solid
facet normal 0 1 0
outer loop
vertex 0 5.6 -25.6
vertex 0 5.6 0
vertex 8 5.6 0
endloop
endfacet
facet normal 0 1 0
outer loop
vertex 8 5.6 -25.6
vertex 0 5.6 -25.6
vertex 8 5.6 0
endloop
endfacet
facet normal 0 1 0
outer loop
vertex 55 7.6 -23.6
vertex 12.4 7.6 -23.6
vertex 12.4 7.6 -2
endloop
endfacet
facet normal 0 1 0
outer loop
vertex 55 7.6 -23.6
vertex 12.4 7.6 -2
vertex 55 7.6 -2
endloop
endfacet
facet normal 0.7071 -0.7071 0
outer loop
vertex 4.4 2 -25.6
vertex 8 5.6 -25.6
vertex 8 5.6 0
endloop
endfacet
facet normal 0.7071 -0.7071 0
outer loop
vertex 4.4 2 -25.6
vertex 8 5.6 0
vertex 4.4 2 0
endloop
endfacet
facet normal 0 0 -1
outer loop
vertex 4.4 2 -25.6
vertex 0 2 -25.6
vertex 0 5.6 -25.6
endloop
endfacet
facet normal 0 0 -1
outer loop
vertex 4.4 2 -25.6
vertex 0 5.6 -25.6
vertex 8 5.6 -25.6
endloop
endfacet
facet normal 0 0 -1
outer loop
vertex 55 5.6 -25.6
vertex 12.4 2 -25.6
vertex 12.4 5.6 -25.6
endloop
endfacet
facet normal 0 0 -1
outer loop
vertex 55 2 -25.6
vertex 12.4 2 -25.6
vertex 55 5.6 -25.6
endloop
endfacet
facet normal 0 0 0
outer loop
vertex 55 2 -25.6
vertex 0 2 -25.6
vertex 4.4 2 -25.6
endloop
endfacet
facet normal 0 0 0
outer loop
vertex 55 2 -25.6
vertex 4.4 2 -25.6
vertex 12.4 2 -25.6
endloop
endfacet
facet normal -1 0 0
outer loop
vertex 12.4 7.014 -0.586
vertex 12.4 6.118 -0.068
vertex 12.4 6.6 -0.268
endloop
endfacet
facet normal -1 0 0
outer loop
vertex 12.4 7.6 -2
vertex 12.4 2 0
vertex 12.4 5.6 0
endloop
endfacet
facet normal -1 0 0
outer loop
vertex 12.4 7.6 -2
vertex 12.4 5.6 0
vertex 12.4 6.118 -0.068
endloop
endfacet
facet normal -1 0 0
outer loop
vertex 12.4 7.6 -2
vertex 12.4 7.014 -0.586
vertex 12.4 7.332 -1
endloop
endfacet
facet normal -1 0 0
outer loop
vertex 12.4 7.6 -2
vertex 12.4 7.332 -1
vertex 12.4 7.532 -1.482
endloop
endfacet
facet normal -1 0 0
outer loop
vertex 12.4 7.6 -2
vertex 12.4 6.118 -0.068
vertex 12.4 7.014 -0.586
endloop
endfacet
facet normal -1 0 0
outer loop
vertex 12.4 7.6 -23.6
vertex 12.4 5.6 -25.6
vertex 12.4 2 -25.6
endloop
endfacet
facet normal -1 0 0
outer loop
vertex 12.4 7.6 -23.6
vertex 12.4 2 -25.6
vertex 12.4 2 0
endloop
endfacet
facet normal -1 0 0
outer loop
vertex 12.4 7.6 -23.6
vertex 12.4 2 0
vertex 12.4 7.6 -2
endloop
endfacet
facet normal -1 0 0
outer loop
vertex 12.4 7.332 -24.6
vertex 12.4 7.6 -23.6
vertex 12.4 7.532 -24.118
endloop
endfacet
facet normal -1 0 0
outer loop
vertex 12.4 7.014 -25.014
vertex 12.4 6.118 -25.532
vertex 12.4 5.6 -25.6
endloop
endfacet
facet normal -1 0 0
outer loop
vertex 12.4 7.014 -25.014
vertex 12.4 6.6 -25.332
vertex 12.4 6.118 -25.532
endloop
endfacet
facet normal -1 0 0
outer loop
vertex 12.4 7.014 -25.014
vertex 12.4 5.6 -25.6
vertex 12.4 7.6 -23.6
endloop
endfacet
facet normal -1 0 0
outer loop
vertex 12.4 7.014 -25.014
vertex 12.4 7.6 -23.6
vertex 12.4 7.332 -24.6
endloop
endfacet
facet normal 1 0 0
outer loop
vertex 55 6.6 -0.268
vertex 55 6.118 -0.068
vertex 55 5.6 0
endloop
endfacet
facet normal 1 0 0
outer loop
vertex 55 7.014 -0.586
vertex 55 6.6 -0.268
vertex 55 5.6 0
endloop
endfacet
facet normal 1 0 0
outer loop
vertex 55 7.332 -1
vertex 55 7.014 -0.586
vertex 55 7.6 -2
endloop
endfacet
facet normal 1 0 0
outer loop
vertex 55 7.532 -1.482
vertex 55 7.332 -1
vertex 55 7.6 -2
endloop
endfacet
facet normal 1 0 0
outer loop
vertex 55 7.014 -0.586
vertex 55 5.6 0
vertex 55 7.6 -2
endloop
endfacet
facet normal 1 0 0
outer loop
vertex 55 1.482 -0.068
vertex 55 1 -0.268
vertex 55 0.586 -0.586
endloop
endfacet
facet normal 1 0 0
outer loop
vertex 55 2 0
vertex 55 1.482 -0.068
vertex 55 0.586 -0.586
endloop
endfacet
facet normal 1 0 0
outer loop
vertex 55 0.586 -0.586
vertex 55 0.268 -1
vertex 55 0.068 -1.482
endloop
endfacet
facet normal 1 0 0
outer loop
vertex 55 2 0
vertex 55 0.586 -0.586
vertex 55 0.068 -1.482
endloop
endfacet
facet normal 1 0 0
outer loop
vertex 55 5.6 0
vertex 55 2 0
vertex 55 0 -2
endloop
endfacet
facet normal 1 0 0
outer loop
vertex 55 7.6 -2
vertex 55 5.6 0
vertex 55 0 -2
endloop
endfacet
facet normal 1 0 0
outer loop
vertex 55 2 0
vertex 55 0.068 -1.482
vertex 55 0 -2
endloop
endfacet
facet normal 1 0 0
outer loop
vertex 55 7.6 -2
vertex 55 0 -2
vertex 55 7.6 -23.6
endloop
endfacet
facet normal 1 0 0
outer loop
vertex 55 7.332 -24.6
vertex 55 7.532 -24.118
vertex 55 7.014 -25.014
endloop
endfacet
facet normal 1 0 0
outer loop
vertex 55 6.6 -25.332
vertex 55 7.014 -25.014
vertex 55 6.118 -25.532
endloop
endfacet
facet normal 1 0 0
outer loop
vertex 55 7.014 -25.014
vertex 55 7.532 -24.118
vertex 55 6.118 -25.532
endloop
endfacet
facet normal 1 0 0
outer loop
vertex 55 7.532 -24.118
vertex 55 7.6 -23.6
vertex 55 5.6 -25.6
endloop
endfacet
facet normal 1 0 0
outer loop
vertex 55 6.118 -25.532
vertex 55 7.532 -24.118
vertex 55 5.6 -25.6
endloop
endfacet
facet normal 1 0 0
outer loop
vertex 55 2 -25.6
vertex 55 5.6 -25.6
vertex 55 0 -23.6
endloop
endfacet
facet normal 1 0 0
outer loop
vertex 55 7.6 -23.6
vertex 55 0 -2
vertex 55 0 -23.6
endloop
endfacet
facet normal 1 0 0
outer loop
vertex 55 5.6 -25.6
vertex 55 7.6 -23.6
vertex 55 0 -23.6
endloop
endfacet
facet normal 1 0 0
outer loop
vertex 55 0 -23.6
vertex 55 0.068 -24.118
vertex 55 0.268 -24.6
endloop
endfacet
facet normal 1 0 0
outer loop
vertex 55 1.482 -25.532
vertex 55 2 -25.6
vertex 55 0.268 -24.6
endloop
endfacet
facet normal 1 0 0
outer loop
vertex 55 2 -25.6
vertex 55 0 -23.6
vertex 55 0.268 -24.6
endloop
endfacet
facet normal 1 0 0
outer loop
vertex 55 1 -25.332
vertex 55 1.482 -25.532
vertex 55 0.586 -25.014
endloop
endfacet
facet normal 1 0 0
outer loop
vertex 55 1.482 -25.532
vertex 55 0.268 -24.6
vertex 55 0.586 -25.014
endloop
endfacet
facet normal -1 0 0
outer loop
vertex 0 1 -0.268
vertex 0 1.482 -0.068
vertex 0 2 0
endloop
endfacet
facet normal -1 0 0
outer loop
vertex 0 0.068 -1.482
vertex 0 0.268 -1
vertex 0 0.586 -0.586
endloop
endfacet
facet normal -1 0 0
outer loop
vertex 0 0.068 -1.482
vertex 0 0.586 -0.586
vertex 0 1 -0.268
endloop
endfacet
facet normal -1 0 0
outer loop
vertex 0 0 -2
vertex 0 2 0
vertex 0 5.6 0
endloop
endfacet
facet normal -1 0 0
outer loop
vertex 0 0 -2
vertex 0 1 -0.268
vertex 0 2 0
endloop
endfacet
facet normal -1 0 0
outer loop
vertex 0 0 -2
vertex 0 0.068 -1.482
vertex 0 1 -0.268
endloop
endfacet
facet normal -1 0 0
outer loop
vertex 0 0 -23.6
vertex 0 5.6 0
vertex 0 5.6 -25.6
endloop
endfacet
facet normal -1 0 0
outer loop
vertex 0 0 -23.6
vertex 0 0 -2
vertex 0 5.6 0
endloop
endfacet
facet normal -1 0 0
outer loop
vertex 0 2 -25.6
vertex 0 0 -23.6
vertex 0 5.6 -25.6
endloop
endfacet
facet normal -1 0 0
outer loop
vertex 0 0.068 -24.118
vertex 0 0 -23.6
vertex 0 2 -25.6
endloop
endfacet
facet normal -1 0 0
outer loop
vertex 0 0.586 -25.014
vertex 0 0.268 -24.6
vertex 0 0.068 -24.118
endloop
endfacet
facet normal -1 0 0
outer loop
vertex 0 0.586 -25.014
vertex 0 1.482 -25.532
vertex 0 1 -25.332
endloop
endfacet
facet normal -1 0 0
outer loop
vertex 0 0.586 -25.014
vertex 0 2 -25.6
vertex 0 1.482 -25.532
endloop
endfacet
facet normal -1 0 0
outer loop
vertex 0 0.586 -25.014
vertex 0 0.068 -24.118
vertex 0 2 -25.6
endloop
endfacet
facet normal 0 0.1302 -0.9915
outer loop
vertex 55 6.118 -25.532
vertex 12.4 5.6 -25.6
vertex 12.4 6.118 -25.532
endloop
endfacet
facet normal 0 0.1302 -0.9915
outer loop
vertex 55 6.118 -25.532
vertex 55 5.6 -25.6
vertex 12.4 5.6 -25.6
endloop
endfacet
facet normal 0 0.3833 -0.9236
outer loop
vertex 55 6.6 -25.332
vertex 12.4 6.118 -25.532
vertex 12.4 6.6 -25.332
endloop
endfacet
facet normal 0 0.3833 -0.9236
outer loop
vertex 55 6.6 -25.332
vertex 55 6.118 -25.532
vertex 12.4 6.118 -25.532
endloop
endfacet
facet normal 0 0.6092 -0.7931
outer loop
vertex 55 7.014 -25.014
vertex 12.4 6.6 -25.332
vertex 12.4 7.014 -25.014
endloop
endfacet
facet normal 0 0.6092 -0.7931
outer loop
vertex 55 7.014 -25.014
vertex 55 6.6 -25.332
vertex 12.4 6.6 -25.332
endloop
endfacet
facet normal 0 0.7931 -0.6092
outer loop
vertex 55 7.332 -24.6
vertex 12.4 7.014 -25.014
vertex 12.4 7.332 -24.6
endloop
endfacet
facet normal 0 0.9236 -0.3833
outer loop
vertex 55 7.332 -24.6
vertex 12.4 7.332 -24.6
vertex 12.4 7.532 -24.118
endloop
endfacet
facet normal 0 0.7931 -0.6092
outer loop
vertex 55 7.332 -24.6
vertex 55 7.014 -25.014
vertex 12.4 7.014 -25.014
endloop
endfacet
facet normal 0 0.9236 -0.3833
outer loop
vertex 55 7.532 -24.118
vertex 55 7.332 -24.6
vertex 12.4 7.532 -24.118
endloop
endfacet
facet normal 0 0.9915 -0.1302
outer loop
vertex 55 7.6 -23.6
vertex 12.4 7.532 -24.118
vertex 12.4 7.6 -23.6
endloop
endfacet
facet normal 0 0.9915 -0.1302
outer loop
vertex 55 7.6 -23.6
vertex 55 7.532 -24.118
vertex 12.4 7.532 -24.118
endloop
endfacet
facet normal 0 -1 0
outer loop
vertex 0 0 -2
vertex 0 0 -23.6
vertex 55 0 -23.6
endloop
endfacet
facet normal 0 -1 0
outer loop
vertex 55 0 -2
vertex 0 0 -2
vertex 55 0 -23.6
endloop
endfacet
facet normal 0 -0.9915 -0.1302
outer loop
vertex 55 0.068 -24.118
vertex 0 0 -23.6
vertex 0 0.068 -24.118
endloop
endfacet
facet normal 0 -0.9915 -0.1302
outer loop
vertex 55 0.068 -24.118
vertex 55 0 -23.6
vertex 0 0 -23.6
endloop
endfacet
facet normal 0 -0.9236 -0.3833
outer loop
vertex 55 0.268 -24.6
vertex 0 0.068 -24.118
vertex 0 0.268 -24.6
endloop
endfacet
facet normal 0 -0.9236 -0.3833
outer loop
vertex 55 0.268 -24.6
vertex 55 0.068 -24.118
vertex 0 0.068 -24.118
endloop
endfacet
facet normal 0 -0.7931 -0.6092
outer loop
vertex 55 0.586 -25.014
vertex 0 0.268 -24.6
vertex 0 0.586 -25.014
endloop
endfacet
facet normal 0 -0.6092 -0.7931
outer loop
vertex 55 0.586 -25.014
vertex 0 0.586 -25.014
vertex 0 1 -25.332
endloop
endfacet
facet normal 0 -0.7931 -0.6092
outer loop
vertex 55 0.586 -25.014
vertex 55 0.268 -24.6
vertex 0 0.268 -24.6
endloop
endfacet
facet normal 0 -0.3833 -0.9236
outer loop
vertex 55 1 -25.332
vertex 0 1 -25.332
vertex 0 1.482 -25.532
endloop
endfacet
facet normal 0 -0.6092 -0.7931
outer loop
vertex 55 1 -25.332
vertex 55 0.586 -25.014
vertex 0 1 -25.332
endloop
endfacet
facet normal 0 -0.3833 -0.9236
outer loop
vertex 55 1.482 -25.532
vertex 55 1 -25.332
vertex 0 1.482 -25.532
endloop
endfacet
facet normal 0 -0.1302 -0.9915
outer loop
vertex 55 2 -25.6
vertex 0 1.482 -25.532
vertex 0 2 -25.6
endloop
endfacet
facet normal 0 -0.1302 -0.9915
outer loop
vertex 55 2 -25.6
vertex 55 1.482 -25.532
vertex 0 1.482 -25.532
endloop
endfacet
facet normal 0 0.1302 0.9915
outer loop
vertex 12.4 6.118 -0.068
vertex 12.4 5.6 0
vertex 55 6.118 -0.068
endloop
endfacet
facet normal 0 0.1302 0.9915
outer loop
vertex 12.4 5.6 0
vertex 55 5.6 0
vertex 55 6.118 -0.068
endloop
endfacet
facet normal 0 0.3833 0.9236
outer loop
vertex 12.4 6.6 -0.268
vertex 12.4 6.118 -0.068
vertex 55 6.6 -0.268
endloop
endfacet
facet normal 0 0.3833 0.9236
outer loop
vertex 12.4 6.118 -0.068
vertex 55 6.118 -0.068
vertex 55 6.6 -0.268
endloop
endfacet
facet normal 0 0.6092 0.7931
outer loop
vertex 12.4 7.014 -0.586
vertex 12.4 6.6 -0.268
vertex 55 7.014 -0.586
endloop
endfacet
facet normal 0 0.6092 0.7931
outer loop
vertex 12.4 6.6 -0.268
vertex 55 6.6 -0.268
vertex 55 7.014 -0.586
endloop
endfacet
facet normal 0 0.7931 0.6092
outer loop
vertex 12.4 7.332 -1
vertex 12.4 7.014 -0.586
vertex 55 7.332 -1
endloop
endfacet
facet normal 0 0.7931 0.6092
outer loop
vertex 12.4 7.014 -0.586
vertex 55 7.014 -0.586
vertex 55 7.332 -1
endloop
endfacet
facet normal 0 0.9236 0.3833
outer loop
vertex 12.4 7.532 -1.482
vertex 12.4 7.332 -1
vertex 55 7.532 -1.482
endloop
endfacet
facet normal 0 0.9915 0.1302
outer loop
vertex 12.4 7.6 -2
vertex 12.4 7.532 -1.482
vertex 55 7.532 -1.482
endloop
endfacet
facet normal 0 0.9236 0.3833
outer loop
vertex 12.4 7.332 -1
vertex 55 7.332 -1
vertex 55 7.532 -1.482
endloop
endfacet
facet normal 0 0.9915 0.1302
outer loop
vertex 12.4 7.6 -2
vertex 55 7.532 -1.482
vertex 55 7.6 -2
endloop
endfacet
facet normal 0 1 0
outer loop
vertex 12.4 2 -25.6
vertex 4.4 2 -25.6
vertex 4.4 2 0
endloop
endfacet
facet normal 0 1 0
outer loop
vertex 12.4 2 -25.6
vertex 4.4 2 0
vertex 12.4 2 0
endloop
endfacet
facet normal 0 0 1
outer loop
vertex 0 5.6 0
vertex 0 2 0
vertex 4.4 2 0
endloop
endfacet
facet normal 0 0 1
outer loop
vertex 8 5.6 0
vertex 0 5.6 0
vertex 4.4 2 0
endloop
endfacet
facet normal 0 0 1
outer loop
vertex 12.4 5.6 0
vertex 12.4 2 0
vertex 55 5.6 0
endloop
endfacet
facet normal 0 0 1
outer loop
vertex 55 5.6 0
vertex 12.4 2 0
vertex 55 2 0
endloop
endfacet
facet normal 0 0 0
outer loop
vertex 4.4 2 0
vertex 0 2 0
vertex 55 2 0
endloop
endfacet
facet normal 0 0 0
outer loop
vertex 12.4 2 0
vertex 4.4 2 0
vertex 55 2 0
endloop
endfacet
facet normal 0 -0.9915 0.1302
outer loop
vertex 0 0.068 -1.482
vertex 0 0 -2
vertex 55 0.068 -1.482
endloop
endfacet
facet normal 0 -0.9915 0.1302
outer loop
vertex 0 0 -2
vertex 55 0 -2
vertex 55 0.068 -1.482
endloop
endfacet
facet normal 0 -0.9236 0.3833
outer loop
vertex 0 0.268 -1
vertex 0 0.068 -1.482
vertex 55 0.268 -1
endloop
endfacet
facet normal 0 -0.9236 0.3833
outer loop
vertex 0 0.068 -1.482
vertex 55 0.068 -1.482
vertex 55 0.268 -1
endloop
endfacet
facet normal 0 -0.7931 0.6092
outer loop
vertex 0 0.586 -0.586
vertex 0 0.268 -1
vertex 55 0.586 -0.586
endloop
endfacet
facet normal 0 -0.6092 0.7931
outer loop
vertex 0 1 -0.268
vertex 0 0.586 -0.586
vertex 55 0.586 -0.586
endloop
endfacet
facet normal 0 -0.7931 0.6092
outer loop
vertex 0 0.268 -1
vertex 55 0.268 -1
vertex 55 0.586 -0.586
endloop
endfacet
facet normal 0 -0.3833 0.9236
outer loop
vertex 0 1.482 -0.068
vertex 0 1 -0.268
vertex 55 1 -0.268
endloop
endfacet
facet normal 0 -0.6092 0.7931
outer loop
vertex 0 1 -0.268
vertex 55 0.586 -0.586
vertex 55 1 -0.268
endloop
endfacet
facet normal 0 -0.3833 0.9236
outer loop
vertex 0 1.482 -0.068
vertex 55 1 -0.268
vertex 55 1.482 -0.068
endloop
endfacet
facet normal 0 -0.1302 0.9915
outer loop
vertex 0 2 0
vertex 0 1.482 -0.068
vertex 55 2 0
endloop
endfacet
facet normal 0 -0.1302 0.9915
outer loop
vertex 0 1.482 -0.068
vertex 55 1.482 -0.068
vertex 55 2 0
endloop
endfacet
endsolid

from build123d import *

# Parameters (mm, degrees)
SKETCH1_W           = 55
SKETCH1_H           = 25.6
BOSS_EXTRUDE1_DEPTH = 7.6
CUT_EXTRUDE1_DEPTH  = 25.6
FILLET1_R           = 2


with BuildPart() as part:
    # Sketch1 → Boss-Extrude1 (new body)
    with BuildSketch(Plane(origin=(0, 0, 0), x_dir=(1, 0, 0), z_dir=(0, 1, 0))):
        with Locations((27.5, 12.8)):
            Rectangle(SKETCH1_W, SKETCH1_H)
    extrude(amount=BOSS_EXTRUDE1_DEPTH)

    # Sketch2 → Cut-Extrude1 (cut)
    with BuildSketch(Plane(origin=(0, 0, -25.6), x_dir=(-1, 0, 0), z_dir=(0, 0, -1))):
        Polygon((-8, 5.6), (-4.4, 2), (-12.4, 2), (-12.4, 7.6), (0, 7.6), (0, 5.6), align=None)
    extrude(amount=-CUT_EXTRUDE1_DEPTH, mode=Mode.SUBTRACT)

    # Fillet1
    fillet1_edges = [part.edges().sort_by_distance(p)[0] for p in [
        (33.7, 7.6, -25.6),
        (33.7, 7.6, 0),
        (27.5, 0, -25.6),
        (27.5, 0, 0),
    ]]
    fillet(fillet1_edges, radius=FILLET1_R - 0.0001)  # a hair under: the kernel refuses the full size


solid = part.part
